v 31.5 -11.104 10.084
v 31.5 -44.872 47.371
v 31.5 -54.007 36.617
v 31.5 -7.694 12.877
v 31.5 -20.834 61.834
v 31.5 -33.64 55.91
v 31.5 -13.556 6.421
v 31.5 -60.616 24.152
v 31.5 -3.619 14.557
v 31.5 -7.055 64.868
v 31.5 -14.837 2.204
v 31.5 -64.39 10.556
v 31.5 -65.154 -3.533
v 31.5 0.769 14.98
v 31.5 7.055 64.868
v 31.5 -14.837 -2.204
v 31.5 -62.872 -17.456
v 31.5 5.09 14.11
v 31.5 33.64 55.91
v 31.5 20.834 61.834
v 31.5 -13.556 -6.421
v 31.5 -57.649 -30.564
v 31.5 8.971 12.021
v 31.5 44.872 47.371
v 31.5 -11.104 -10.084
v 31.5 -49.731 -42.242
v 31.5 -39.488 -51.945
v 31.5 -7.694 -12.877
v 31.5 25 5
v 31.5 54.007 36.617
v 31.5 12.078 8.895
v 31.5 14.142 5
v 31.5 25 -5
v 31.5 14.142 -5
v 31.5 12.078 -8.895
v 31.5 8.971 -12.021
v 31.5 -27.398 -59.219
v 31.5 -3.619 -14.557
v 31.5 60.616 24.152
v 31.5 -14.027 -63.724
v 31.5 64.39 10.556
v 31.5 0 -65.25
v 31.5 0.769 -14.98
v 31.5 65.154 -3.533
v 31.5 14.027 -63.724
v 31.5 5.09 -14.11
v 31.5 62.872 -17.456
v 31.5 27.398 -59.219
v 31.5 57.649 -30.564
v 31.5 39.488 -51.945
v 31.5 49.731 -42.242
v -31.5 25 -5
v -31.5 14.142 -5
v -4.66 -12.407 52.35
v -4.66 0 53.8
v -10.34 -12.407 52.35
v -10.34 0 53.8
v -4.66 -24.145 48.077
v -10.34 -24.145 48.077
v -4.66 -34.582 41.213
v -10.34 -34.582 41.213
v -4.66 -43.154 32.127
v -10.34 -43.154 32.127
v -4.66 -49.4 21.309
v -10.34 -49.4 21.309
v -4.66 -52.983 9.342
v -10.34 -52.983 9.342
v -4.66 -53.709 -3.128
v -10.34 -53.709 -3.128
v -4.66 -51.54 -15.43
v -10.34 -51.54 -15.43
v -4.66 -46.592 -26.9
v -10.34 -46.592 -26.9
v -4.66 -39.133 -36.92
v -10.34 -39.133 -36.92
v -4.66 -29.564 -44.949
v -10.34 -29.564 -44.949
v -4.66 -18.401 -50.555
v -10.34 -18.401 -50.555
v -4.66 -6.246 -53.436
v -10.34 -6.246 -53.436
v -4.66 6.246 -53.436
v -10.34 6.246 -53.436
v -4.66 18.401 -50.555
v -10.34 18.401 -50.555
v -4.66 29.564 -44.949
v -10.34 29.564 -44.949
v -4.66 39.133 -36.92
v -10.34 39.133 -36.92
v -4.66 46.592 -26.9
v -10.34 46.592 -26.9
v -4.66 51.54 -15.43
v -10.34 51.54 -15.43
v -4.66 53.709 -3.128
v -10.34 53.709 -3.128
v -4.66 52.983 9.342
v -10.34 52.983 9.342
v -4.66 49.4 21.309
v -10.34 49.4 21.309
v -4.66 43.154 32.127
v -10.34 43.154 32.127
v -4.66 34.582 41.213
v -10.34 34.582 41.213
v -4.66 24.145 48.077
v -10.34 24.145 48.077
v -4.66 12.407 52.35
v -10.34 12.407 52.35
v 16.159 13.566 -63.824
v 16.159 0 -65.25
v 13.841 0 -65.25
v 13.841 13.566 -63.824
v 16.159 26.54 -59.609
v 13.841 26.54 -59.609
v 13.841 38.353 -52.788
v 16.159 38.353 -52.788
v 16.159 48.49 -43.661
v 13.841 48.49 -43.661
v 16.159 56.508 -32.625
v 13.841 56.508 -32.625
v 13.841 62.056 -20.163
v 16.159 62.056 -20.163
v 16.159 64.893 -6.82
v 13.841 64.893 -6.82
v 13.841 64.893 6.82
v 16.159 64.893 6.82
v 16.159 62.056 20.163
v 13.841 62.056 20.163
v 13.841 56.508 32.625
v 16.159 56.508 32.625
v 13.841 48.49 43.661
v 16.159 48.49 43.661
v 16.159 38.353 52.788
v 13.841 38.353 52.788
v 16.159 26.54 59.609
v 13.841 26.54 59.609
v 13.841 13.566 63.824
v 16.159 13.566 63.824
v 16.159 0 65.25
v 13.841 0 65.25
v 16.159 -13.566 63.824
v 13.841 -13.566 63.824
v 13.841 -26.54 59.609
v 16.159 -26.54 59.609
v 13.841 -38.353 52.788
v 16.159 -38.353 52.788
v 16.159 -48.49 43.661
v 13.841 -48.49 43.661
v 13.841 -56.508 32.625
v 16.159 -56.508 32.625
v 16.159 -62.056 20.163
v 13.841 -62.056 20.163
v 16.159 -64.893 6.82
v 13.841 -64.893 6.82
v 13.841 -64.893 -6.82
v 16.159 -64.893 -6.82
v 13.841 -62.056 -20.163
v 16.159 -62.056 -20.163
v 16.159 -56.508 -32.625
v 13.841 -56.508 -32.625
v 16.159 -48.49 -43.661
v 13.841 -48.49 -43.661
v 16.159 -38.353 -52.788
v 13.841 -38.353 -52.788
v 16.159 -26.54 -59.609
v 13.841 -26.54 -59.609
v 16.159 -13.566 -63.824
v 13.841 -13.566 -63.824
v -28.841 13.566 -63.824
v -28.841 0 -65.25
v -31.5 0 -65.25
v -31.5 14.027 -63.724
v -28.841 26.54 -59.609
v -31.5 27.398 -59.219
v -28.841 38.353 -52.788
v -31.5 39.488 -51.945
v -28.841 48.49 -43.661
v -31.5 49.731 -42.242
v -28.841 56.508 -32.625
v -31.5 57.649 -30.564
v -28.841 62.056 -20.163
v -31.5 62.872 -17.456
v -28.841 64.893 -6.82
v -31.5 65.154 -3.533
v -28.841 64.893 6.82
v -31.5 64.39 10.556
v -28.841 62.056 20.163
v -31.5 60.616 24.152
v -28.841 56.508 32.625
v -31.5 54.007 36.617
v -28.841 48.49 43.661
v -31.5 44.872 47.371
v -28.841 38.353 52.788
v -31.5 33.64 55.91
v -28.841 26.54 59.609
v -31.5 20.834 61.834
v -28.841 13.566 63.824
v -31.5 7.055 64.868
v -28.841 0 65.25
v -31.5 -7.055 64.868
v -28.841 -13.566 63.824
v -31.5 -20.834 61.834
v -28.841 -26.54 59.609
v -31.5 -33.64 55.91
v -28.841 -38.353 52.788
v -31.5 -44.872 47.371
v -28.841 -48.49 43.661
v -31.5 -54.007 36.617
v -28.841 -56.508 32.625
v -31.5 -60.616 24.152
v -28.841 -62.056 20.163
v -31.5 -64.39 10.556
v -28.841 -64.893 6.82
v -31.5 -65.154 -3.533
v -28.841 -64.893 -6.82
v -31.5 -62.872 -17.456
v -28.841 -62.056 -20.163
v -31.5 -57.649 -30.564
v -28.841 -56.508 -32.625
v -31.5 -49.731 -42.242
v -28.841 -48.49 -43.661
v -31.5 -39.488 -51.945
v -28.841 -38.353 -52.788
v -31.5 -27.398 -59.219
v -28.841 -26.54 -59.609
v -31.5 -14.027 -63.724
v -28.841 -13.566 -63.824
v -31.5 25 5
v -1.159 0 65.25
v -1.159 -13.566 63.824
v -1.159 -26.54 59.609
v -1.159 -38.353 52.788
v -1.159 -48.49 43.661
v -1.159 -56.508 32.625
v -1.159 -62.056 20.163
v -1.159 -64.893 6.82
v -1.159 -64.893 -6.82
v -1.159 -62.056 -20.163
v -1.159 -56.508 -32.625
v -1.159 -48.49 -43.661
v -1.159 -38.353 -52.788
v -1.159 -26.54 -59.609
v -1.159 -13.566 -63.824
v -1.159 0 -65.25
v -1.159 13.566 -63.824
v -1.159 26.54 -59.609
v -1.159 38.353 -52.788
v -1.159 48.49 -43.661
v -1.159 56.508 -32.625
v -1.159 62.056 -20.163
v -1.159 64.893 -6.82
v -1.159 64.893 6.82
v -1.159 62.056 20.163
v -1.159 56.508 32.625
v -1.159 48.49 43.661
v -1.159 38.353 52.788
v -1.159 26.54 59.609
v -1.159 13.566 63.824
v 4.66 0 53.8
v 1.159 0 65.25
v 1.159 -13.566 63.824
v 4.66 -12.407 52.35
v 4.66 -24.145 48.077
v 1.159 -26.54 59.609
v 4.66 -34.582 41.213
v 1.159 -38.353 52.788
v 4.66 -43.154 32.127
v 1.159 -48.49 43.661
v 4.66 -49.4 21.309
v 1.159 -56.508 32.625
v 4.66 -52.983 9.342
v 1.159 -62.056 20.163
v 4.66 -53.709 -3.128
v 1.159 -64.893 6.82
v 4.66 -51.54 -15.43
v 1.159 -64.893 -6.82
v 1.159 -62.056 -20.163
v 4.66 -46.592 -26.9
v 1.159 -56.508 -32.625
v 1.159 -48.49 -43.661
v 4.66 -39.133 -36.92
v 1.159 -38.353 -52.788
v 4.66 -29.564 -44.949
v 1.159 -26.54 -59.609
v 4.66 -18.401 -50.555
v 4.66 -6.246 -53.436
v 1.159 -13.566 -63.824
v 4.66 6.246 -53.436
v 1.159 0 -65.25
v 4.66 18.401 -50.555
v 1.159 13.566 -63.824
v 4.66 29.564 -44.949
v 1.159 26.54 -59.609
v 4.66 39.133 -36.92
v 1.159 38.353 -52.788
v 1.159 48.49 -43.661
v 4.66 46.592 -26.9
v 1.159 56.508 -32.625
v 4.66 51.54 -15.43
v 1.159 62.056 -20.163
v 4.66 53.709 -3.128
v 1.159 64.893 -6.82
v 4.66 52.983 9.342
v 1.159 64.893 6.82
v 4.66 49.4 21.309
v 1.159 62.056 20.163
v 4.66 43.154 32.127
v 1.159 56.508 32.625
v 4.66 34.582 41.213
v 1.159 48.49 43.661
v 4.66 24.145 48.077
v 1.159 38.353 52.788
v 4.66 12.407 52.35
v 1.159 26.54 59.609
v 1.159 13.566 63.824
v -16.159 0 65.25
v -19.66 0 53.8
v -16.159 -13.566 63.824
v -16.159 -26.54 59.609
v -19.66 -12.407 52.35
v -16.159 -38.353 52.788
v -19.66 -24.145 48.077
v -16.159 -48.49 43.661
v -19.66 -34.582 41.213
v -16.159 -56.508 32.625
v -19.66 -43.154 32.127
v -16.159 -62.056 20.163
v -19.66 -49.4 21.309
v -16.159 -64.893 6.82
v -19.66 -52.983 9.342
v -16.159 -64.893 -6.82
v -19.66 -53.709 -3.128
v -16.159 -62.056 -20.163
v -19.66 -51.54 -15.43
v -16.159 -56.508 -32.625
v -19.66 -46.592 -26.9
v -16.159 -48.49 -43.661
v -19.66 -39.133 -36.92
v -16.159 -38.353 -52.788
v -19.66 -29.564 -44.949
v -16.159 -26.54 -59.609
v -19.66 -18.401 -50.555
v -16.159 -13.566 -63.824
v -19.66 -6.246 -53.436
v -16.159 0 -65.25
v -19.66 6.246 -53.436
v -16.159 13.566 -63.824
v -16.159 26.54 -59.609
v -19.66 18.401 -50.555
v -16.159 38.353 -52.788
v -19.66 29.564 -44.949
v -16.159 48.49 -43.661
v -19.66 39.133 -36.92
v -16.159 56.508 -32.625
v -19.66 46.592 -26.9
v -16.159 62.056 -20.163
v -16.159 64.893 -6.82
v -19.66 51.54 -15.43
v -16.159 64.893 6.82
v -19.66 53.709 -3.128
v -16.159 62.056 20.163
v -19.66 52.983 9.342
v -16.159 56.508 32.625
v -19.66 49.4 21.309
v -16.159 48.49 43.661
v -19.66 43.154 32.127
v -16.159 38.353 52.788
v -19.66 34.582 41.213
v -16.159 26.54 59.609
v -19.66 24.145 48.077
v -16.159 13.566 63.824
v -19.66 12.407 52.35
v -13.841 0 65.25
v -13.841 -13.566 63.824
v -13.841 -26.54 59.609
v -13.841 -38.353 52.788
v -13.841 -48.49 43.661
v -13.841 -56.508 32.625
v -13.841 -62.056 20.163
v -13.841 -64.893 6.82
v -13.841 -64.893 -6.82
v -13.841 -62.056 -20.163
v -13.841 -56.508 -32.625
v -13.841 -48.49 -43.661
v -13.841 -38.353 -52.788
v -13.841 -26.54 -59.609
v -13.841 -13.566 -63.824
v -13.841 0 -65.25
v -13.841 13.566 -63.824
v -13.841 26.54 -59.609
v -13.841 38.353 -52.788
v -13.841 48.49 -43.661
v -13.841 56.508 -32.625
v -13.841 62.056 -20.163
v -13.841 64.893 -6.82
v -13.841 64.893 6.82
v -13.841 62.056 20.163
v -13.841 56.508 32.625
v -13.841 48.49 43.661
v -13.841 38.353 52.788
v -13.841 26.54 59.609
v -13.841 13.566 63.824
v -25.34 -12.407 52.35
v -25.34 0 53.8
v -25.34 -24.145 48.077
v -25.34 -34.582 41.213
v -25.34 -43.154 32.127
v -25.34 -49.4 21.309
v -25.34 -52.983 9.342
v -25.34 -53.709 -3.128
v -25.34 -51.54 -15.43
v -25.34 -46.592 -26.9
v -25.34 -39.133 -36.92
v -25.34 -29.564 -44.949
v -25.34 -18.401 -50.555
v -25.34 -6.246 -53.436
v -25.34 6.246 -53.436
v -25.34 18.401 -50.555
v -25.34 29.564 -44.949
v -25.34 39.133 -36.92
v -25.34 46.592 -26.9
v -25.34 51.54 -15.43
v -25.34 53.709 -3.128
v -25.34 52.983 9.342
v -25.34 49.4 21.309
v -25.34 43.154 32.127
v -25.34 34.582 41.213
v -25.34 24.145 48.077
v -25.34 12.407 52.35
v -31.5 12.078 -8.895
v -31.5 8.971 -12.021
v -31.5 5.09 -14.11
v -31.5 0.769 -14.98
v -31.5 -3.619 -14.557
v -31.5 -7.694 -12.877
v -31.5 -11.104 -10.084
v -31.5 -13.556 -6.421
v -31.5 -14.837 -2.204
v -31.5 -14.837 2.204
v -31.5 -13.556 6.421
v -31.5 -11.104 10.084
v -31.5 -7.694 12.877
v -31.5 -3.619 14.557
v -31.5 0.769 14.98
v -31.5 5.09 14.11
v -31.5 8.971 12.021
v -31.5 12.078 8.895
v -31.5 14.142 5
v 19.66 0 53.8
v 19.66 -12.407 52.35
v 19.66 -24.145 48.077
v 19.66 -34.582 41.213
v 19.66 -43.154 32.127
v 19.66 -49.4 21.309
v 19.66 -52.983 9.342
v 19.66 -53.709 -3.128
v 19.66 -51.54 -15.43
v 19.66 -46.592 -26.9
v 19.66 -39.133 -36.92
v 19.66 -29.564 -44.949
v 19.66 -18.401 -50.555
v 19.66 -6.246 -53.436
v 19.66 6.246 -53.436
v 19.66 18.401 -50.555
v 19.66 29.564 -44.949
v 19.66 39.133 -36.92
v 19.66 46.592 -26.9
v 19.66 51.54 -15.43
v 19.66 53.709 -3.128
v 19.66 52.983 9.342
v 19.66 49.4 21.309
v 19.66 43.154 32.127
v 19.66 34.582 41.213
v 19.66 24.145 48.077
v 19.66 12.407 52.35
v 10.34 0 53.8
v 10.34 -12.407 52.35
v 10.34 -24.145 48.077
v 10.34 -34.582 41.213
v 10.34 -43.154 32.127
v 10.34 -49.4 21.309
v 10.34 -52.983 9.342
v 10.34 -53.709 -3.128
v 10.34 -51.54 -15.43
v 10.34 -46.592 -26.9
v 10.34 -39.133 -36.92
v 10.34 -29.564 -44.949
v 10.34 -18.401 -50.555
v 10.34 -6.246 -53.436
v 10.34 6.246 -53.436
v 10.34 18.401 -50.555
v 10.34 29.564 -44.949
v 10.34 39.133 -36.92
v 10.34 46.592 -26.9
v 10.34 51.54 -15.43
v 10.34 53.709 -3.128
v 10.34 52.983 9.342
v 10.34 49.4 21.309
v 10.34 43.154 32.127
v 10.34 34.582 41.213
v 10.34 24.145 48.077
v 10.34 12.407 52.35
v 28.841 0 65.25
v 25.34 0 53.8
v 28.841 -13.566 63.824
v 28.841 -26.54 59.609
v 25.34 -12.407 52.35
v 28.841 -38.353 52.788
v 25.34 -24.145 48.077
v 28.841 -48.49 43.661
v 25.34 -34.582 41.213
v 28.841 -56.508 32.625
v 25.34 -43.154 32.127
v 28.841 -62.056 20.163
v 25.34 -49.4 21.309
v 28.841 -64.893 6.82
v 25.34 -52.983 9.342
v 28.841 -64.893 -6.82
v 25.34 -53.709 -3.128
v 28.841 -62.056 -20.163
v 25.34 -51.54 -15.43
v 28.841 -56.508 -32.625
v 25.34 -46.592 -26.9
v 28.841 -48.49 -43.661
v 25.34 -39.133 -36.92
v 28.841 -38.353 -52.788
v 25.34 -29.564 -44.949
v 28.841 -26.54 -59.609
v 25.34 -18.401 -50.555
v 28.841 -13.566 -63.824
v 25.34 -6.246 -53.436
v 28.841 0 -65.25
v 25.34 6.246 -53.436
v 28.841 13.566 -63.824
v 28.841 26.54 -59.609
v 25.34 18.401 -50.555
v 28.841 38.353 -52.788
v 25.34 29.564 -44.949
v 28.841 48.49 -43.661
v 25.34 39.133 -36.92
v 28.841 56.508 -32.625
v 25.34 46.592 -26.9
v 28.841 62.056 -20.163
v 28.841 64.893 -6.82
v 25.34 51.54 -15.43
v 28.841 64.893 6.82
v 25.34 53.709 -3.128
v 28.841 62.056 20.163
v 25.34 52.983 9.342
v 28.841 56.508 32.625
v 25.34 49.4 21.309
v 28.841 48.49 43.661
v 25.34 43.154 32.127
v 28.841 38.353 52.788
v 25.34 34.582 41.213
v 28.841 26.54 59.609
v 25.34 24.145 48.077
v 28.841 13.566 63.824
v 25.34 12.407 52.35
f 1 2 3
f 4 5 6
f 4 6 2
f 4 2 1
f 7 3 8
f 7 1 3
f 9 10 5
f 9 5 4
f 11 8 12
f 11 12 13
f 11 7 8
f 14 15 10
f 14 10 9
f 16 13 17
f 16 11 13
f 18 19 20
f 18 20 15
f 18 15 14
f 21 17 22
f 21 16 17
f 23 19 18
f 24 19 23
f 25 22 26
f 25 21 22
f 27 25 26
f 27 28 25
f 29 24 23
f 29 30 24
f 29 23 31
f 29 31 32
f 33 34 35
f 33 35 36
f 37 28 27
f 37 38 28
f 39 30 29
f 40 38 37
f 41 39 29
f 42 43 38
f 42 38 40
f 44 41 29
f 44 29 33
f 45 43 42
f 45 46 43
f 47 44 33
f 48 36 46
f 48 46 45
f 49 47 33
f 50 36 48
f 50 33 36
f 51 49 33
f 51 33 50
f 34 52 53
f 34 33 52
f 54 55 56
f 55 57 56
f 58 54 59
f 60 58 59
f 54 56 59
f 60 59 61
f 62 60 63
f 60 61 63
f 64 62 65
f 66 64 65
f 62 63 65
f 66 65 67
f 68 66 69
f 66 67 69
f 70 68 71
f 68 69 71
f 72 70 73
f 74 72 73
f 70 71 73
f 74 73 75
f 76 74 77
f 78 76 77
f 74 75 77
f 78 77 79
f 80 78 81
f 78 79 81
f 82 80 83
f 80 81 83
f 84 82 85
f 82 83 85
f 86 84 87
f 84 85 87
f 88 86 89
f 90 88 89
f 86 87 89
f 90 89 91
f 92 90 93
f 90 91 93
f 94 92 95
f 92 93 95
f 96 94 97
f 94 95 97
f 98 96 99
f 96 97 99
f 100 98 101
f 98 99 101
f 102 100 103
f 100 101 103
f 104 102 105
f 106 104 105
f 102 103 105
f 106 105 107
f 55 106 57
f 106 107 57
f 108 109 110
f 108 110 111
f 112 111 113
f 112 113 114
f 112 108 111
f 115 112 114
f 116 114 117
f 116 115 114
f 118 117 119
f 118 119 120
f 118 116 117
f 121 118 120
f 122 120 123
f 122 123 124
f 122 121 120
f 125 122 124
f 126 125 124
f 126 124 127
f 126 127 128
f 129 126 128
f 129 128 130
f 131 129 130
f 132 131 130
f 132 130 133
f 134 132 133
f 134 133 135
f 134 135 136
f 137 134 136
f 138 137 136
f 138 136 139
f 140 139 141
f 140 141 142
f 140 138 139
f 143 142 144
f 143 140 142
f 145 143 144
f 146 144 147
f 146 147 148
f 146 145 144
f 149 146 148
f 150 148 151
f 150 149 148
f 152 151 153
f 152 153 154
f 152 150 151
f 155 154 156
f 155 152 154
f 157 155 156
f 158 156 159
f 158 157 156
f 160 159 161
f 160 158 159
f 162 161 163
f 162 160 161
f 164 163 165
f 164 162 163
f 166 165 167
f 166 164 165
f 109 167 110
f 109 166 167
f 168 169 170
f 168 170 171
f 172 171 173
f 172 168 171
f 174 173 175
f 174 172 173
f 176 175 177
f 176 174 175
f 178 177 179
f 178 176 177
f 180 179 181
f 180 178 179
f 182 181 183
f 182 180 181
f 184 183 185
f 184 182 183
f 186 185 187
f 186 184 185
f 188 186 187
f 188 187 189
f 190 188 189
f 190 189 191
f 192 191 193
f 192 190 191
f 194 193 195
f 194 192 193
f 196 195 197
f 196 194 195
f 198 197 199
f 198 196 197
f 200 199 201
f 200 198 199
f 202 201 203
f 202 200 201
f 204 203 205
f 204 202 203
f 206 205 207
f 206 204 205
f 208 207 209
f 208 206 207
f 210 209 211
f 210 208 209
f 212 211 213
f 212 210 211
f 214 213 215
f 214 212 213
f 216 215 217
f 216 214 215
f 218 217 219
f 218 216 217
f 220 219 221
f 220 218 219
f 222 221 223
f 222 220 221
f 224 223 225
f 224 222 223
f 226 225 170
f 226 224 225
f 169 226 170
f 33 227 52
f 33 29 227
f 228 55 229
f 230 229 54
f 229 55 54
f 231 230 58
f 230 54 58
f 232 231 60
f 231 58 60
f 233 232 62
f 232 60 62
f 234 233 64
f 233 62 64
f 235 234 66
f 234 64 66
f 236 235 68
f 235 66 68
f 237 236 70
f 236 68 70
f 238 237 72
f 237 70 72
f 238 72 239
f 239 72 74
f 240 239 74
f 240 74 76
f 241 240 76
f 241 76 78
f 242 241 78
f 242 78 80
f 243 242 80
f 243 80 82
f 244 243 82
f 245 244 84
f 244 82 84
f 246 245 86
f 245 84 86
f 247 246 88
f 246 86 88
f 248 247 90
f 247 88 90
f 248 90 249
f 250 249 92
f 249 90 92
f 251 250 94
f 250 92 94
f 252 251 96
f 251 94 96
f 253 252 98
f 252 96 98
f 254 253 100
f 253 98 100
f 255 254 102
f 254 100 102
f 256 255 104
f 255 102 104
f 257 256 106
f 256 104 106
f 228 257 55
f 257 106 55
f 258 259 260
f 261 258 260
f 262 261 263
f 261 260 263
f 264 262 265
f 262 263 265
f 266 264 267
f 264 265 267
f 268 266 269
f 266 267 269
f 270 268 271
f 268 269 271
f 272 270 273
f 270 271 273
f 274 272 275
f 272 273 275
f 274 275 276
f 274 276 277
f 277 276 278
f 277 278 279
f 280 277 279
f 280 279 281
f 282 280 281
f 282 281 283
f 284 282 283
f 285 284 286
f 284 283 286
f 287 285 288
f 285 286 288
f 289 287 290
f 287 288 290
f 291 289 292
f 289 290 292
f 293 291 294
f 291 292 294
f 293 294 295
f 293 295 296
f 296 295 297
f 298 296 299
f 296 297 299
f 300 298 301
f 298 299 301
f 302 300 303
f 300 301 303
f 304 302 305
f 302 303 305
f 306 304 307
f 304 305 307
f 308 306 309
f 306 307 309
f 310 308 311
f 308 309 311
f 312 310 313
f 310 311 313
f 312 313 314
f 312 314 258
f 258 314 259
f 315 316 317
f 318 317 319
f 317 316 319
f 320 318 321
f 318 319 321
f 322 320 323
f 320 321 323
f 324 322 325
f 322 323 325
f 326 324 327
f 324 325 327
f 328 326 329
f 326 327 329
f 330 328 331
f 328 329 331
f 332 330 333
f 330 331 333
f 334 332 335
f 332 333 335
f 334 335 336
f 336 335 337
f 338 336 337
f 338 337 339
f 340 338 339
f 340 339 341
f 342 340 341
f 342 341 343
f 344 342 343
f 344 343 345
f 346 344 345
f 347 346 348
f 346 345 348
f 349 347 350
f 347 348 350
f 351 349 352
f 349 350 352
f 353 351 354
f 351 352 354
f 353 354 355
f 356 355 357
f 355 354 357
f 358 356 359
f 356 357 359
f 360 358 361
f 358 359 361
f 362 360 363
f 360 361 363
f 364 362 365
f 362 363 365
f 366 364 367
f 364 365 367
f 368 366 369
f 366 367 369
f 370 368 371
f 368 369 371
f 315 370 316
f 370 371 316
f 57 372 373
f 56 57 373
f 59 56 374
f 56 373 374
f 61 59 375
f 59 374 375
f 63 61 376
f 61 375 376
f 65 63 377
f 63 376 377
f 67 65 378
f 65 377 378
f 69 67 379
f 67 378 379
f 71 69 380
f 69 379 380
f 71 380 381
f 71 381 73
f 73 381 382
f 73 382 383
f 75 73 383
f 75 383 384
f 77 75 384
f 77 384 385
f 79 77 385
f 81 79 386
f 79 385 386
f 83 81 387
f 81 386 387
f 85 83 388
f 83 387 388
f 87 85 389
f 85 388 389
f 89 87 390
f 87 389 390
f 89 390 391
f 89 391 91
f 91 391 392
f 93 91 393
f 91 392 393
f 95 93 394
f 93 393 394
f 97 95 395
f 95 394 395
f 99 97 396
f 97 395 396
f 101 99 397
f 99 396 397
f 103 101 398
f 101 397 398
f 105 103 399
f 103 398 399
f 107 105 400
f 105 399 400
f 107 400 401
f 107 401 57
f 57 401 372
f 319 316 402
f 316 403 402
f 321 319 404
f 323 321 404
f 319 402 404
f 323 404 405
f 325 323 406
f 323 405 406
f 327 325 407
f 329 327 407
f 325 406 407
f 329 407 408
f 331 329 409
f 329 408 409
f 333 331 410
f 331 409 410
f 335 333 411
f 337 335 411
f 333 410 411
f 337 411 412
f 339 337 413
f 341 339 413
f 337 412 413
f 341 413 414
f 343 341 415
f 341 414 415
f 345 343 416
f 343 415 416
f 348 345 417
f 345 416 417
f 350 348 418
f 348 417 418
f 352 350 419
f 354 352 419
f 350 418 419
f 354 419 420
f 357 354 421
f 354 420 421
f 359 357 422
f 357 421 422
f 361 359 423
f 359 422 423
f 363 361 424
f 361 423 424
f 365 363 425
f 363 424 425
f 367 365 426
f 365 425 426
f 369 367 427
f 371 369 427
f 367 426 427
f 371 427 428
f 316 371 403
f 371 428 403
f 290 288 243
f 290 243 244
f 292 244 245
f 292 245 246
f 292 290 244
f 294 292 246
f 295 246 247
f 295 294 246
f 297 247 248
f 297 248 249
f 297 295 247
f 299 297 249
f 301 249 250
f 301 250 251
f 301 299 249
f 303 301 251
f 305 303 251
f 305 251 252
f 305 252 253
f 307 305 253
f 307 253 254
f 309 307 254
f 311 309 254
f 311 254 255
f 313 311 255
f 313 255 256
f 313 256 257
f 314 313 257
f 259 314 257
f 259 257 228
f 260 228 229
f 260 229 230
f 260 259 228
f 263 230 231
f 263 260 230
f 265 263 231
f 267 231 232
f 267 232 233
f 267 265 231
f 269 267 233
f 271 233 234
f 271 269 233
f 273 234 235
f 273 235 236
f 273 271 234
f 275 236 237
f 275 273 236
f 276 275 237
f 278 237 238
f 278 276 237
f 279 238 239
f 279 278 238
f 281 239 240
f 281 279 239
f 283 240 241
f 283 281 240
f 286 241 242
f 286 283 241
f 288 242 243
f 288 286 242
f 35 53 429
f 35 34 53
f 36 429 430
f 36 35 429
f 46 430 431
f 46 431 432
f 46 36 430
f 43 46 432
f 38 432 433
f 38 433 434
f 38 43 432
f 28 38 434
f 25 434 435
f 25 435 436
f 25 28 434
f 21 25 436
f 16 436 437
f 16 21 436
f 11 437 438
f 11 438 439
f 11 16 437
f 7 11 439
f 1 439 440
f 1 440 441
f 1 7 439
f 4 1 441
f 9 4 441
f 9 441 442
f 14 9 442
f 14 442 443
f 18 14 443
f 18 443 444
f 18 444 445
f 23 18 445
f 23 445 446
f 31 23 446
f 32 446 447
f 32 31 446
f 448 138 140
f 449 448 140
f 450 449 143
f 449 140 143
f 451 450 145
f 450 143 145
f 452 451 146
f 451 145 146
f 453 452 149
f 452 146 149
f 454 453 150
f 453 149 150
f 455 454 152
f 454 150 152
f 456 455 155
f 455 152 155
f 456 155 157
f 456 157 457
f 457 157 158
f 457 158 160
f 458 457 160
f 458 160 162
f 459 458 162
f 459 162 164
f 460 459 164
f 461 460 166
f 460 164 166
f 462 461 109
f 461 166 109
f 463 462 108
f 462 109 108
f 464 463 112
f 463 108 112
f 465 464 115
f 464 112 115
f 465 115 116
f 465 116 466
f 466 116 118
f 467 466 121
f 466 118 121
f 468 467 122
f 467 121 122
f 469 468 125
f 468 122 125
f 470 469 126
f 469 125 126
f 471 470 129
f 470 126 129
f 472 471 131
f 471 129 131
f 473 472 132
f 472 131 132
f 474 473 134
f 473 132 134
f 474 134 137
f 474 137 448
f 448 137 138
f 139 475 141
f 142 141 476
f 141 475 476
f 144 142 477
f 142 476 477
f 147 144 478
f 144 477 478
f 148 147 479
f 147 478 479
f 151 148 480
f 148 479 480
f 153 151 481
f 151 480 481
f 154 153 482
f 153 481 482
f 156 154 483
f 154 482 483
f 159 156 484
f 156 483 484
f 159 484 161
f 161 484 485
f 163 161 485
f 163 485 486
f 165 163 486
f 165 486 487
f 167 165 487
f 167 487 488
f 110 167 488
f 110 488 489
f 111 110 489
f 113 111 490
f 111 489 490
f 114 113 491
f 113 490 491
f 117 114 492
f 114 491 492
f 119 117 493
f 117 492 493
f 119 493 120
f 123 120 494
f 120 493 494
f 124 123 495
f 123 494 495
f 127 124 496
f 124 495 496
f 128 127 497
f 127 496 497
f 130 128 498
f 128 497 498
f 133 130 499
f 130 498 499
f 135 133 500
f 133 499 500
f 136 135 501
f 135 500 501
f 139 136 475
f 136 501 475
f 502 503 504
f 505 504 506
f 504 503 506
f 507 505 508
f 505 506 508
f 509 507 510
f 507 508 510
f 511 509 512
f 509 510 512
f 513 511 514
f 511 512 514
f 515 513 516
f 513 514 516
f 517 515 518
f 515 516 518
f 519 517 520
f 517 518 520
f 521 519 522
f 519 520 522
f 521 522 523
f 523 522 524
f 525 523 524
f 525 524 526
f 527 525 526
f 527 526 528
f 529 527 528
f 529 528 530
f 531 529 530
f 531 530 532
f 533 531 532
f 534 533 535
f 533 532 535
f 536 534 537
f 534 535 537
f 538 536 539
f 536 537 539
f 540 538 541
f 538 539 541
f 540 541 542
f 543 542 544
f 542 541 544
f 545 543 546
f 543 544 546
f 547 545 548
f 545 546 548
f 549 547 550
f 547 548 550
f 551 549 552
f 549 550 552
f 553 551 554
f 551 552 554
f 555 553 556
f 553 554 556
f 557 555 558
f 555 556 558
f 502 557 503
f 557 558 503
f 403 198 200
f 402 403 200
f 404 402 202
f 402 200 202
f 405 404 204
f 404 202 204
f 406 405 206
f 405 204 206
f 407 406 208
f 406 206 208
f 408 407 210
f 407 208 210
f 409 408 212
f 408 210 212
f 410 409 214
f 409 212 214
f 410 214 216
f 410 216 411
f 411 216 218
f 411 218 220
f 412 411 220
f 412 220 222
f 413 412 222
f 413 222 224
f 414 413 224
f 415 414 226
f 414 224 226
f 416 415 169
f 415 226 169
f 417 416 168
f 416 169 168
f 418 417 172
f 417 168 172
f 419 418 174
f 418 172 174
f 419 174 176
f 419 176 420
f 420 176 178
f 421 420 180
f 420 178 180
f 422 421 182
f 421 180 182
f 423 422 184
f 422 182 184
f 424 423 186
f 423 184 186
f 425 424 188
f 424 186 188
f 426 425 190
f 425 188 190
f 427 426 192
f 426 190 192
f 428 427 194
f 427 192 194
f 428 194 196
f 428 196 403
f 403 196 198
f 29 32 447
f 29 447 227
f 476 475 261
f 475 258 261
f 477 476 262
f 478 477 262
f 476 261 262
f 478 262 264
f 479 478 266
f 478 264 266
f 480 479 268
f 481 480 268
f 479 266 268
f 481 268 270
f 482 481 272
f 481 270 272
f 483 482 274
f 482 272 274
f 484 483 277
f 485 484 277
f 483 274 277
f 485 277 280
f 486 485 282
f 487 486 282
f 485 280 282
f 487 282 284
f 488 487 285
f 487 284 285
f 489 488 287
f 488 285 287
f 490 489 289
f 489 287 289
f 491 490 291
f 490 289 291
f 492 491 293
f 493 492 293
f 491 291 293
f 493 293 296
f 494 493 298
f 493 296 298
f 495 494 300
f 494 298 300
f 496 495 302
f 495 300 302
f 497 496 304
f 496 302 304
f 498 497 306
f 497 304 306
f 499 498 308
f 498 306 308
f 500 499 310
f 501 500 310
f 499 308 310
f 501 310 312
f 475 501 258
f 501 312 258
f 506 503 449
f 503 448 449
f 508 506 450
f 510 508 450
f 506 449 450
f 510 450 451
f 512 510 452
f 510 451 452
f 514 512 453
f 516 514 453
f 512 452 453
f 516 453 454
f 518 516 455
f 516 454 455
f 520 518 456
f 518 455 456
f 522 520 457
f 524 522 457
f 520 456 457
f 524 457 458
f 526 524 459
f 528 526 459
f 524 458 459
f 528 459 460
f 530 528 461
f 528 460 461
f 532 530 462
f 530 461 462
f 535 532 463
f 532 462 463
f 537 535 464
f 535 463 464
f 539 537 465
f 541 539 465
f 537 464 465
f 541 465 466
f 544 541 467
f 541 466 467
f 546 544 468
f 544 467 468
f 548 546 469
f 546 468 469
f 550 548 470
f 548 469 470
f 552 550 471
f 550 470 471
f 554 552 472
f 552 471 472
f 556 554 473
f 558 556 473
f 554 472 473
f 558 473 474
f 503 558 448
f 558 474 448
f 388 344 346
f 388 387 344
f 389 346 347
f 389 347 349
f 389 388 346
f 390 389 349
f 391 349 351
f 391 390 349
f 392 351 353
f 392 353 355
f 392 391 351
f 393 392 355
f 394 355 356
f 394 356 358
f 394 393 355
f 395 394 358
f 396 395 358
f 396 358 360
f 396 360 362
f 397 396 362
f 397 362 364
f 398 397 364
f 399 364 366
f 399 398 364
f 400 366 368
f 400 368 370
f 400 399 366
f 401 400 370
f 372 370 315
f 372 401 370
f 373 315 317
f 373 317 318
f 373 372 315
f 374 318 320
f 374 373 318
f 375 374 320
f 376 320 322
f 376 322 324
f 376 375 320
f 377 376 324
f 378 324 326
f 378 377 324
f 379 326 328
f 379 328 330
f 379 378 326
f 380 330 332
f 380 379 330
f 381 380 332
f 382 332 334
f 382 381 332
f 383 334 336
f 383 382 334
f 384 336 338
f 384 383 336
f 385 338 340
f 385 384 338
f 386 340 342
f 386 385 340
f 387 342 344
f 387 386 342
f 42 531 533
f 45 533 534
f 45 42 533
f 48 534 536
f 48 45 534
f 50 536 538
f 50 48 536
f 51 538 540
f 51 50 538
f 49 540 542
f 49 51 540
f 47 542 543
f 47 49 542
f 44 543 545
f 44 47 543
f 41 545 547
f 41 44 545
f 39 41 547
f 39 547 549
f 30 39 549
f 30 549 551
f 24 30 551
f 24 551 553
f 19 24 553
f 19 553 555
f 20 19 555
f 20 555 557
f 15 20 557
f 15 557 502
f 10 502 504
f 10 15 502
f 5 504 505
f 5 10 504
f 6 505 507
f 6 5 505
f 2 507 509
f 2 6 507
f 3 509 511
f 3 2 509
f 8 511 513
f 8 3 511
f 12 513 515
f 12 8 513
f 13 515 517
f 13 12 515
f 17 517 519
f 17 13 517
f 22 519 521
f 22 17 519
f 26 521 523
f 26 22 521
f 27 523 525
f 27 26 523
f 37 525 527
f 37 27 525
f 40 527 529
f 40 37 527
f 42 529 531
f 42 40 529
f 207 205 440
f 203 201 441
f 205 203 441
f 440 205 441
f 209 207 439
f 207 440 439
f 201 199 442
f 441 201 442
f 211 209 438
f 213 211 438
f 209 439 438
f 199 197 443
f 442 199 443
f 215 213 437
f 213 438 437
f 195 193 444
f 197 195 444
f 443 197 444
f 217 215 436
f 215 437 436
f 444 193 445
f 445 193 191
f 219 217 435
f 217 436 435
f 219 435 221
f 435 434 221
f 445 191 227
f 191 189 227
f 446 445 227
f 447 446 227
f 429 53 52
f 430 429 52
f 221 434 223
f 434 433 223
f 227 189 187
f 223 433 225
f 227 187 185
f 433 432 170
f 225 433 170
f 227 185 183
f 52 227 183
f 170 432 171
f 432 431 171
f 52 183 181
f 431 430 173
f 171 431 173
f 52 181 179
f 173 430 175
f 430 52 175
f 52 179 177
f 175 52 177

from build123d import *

# Parameters (mm, degrees)
SKETCH_1_R             = 65.25
EXTRUDE_1_DEPTH        = 31.5
PATTERN_LINEAR_1_COUNT = 4
PATTERN_LINEAR_1_PITCH = 15


with BuildPart() as part:
    # 草图1 → 凸台-拉伸1 (new, symmetric)
    with BuildSketch(Plane(origin=(0, 0, 0), x_dir=(0, 0, -1), z_dir=(1, 0, 0))):
        Circle(SKETCH_1_R)
        with BuildLine():
            Line((-5, 14.142135624), (-5, 25))
            Line((-5, 25), (5, 25))
            Line((5, 25), (5, 14.142135624))
            ThreePointArc((5, 14.142135624), (0, -15), (-5, 14.142135624))
        make_face(mode=Mode.SUBTRACT)
    extrude(amount=EXTRUDE_1_DEPTH, both=True)

    # 草图2 → 切除-旋转1 (revolve, cut)
    with BuildSketch(Plane.XY, mode=Mode.PRIVATE) as cut_revolve_1_sk:
        Polygon((-28.840759374, 65.25), (-16.159240626, 65.25), (-19.659856929, 53.8), (-25.340143071, 53.8), align=None)
    cut_revolve_1 = revolve(cut_revolve_1_sk.sketch.rotate(Axis((0, 0, 0), (1, 0, 0)), 90), axis=Axis((0, 0, 0), (1, 0, 0)), mode=Mode.SUBTRACT)

    # 阵列(线性)1: 切除-旋转1 ×4
    with Locations(*[(i * PATTERN_LINEAR_1_PITCH, 0, 0) for i in range(1, PATTERN_LINEAR_1_COUNT)]):
        add(cut_revolve_1, mode=Mode.SUBTRACT)


solid = part.part
